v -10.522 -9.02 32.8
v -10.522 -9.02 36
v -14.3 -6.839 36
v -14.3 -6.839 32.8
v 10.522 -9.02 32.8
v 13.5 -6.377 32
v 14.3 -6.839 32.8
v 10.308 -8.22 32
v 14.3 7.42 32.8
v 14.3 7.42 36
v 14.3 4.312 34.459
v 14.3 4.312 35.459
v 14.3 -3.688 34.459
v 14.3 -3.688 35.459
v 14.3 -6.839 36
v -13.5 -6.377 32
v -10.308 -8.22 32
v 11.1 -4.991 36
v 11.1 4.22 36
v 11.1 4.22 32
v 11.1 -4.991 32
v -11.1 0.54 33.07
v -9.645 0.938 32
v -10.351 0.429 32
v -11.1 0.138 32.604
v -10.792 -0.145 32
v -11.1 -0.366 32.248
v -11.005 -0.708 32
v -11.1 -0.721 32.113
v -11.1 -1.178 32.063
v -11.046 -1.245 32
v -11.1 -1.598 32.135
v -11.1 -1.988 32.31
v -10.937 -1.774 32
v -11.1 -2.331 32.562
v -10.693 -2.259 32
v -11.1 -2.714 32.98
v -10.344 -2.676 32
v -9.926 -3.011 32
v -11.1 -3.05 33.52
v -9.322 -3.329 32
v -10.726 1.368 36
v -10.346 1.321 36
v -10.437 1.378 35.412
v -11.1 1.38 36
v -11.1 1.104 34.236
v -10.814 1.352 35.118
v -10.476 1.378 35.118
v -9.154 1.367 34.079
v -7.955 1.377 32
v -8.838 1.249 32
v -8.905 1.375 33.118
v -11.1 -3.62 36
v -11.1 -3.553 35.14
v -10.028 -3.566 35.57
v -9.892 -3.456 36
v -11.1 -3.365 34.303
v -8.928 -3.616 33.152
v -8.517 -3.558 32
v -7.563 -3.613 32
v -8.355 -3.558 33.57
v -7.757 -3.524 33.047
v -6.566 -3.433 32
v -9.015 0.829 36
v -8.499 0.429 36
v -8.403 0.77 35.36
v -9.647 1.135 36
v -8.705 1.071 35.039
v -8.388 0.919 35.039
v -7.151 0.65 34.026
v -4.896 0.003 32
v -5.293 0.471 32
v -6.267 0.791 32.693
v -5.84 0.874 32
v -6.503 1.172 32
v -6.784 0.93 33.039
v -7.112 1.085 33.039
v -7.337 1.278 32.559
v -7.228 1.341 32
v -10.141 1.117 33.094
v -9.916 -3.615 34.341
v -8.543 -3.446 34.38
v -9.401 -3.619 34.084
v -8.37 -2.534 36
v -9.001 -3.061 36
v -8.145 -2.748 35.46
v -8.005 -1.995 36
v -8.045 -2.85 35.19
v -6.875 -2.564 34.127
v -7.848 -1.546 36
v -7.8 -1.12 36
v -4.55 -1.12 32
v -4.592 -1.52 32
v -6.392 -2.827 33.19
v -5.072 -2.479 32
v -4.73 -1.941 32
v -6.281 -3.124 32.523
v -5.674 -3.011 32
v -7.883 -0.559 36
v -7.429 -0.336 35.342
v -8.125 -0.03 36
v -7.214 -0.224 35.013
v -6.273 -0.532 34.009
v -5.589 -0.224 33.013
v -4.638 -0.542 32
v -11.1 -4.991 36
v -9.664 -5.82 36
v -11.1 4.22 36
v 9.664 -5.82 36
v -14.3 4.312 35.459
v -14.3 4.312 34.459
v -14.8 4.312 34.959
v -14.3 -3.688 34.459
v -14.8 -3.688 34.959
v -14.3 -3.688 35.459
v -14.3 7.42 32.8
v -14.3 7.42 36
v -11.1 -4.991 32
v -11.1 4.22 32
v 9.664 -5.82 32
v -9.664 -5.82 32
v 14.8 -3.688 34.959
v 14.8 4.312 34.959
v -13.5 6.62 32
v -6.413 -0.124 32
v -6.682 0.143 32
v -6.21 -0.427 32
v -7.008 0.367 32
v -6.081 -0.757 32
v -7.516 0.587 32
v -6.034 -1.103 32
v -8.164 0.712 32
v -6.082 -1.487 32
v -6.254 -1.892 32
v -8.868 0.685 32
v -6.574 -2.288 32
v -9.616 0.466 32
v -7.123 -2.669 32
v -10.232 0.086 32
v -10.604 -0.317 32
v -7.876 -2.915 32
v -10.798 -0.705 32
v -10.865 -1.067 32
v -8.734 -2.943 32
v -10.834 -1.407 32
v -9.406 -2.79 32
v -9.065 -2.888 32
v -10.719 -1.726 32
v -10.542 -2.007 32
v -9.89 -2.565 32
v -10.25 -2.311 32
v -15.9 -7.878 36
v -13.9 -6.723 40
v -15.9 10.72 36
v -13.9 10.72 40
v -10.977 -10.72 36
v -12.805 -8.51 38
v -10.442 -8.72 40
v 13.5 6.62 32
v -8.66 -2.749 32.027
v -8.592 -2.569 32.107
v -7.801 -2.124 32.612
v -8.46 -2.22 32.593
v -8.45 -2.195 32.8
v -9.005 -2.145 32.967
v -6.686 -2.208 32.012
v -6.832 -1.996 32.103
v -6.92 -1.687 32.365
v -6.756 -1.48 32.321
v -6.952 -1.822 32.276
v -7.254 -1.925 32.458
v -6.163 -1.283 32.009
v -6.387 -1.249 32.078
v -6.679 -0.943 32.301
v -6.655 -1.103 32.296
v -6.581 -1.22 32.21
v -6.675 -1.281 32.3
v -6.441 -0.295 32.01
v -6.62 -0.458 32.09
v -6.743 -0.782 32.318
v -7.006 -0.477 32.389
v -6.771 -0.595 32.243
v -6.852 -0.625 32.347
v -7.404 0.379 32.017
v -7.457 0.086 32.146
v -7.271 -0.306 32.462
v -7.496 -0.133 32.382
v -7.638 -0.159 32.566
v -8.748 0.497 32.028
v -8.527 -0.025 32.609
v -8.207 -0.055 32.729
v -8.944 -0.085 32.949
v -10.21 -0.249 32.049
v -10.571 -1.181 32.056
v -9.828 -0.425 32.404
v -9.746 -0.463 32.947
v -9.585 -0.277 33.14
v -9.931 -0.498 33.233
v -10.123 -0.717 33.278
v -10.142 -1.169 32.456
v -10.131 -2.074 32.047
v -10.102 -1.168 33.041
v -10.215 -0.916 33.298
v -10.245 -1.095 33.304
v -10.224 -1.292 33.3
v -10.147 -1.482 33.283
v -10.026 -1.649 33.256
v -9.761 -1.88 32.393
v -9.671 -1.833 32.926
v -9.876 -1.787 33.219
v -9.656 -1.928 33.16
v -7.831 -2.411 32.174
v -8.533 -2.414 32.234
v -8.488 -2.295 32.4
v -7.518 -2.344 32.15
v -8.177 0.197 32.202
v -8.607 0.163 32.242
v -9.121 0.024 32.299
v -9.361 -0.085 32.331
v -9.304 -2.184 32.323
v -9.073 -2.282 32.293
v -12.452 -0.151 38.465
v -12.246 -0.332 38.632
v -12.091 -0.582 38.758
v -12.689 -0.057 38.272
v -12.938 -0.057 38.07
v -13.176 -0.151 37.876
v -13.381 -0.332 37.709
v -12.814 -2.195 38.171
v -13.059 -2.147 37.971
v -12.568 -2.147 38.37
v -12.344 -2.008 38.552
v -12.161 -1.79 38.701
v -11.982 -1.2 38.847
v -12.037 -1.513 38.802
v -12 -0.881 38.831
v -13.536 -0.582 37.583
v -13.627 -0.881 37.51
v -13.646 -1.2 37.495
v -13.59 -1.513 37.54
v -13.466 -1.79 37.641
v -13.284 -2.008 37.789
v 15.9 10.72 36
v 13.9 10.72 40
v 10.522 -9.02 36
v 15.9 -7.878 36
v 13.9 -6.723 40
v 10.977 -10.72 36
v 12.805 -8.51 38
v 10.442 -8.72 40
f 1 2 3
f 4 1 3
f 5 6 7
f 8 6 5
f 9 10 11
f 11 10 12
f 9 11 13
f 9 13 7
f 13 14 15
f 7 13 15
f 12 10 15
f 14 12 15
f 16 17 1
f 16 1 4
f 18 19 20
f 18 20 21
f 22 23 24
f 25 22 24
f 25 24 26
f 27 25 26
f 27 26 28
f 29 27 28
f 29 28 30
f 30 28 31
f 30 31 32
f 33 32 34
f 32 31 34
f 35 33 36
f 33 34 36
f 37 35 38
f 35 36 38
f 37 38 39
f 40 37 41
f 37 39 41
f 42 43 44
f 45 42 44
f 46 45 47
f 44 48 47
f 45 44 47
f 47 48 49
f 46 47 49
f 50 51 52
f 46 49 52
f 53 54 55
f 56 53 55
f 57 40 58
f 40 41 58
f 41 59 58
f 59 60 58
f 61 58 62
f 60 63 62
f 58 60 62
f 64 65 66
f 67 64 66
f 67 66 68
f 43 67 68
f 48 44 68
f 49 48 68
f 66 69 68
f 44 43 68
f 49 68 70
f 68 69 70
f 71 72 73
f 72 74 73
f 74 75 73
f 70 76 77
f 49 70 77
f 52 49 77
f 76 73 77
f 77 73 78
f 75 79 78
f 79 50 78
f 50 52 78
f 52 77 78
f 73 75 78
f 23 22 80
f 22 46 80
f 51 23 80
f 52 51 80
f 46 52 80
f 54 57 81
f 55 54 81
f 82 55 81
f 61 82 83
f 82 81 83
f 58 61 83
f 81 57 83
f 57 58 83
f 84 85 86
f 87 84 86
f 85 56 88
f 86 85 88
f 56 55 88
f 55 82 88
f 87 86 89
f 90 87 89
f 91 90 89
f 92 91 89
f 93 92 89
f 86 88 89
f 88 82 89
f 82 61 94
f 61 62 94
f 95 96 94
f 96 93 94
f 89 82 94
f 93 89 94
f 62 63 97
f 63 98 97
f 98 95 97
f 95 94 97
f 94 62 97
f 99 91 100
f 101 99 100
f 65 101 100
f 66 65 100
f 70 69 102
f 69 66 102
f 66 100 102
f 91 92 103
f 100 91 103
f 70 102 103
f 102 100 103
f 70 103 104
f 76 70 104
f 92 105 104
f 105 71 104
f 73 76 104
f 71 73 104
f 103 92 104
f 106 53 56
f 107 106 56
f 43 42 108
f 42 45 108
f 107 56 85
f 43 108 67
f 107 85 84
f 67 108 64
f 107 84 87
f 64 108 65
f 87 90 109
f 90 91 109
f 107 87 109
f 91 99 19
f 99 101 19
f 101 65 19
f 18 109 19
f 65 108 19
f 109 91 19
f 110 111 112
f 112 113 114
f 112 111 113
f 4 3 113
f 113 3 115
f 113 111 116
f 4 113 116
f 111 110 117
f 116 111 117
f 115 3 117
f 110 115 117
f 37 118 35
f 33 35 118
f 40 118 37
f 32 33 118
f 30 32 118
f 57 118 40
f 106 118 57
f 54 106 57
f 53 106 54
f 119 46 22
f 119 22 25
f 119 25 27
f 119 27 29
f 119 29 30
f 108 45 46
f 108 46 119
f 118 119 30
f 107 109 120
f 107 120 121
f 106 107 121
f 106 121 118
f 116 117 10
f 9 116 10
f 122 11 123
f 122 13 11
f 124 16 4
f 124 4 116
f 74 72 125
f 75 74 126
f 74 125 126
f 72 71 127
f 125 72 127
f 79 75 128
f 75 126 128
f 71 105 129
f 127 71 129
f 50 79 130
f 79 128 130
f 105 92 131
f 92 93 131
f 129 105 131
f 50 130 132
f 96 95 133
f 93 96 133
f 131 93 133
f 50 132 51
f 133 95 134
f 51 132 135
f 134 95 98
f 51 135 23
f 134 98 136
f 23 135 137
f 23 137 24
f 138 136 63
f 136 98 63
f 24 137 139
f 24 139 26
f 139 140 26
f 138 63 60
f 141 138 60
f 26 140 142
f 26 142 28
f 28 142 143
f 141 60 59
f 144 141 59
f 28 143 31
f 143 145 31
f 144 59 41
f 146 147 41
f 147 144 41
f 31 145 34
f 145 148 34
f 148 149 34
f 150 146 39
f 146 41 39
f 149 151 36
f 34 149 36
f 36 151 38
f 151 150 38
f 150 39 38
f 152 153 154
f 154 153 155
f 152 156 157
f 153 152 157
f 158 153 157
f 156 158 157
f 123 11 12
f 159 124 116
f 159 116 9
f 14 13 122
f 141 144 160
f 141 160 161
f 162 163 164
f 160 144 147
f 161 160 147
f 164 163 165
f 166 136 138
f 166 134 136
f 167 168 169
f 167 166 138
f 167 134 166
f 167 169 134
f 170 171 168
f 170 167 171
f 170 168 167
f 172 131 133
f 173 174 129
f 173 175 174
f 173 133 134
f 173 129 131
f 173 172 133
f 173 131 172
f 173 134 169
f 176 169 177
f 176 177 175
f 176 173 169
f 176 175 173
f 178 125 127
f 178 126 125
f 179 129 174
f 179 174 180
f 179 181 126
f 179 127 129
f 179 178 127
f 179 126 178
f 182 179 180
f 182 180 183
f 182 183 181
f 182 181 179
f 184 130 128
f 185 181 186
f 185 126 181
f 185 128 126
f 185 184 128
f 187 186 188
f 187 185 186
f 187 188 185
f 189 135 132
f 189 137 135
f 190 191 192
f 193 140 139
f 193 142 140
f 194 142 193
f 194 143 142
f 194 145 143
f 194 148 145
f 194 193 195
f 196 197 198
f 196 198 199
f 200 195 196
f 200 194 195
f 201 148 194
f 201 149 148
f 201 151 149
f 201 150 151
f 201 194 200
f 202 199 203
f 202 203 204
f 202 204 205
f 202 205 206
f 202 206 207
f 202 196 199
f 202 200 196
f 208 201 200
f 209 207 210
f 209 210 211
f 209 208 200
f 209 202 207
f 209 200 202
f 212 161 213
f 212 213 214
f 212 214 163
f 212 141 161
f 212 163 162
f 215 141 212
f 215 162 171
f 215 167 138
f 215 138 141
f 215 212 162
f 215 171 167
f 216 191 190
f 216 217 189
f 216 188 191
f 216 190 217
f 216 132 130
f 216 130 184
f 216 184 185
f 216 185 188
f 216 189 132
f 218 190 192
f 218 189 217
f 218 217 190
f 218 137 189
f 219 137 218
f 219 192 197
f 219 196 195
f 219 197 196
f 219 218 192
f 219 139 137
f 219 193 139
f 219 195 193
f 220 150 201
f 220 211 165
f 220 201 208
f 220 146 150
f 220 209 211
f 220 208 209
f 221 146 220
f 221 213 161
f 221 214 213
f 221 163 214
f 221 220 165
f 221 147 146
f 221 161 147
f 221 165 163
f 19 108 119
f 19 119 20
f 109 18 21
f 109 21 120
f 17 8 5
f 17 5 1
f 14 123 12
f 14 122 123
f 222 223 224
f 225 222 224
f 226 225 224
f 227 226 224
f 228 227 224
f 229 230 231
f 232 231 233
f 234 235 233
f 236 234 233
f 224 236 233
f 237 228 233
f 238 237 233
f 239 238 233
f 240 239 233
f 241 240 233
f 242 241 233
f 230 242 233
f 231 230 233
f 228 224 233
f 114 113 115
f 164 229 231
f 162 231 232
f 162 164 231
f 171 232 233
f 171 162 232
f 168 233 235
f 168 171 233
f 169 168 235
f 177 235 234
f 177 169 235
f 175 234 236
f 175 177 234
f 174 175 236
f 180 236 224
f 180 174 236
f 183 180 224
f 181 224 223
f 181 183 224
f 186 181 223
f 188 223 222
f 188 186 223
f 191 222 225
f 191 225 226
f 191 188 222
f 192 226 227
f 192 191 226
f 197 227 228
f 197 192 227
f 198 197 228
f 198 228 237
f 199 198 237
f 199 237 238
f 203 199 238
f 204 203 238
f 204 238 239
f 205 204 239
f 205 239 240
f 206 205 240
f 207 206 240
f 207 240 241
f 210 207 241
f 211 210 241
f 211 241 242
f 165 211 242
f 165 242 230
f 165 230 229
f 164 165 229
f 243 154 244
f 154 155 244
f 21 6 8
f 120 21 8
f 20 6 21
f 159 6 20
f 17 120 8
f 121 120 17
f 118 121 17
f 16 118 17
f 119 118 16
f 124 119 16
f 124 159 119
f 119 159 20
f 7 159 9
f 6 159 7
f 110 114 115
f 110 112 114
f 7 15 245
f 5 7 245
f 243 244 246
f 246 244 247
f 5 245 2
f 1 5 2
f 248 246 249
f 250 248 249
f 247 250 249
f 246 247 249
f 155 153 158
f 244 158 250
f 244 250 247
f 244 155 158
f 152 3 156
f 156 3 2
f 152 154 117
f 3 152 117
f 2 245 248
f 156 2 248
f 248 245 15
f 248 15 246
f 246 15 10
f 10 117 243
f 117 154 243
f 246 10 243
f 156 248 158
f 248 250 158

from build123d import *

# Parameters (mm, degrees)
PAD004_DEPTH    = 4
CHAMFER002_SIZE = 0.8
PAD015_DEPTH    = 4
SKETCH039_R     = 1.075
POCKET005_DEPTH = 10
FILLET003_R     = 0.8


with BuildPart() as part:
    # Sketch015 → AdditiveLoft001 section 0
    with BuildSketch(Plane.XY.offset(36)):
        Polygon((-15.9, 10.72), (15.9, 10.72), (15.9, -7.877957), (10.977437, -10.72), (-10.977437, -10.72), (-15.9, -7.877957), align=None)
    # Sketch016 → AdditiveLoft001 section 1
    with BuildSketch(Plane.XY.offset(40)):
        Polygon((-13.9, -6.723257), (-13.9, 10.72), (13.9, 10.72), (13.9, -6.723257), (10.441539, -8.72), (-10.441539, -8.72), align=None)
    loft()

    # Sketch017 → Pad004 (new body)
    with BuildSketch(Plane.XY.offset(36)):
        Polygon((-14.3, 7.42), (14.3, 7.42), (14.3, -6.838727), (10.521924, -9.02), (-10.521924, -9.02), (-14.3, -6.838727), align=None)
        Polygon((-11.1, 4.22), (11.1, 4.22), (11.1, -4.991206), (9.664486, -5.82), (-9.664486, -5.82), (-11.1, -4.991206), align=None, mode=Mode.SUBTRACT)
    extrude(amount=-PAD004_DEPTH)

    # Chamfer002
    chamfer002_edges = [part.edges().sort_by_distance(p)[0] for p in [
        (-14.3, 0.290637, 32),
        (-12.410962, -7.929363, 32),
        (0, -9.02, 32),
        (12.410962, -7.929363, 32),
        (14.3, 0.290637, 32),
        (0, 7.42, 32),
    ]]
    chamfer(chamfer002_edges, length=CHAMFER002_SIZE)

    # Sketch040 (on DatumPlane) → Pad015 (join, symmetric)
    with BuildSketch(Plane(origin=(-14.8, 0.311769, 0), x_dir=(-1, 0, 0), z_dir=(0, 1, 0))):
        Polygon((-29.6, 34.958579), (-29.1, 35.458579), (-29.1, 34.458579), align=None)
        Polygon((0, 34.958579), (-0.5, 35.458579), (-0.5, 34.458579), align=None)
    extrude(amount=PAD015_DEPTH, both=True)

    # Sketch018 → AdditiveLoft002 section 0
    with BuildSketch(Plane.XY.offset(36)):
        with BuildLine():
            add(Edge.make_bspline(
                [(-7.8, -1.12), (-7.8, 3.210127), (-12.675, 1.045064), (-17.55, -1.12), (-12.675, -3.285064), (-7.8, -5.450127), (-7.8, -1.12)],
                knots=[0, 0, 0, 2.094395, 2.094395, 4.18879, 4.18879, 6.283185, 6.283185, 6.283185], degree=2, weights=[1, 0.5, 1, 0.5, 1, 0.5, 1]))
        make_face()
    # Sketch019 → AdditiveLoft002 section 1
    with BuildSketch(Plane.XY.offset(32)):
        with BuildLine():
            add(Edge.make_bspline(
                [(-4.55, -1.12), (-4.55, 3.210127), (-9.425, 1.045064), (-14.3, -1.12), (-9.425, -3.285064), (-4.55, -5.450127), (-4.55, -1.12)],
                knots=[0, 0, 0, 2.094395, 2.094395, 4.18879, 4.18879, 6.283185, 6.283185, 6.283185], degree=2, weights=[1, 0.5, 1, 0.5, 1, 0.5, 1]))
        make_face()
    loft()

    # Sketch039 (on DatumPlane) → Pocket005 (cut)
    with BuildSketch(Plane(origin=(-4.55, -1.12, 32), x_dir=(0, -1, 0), z_dir=(-0.630593, 0, 0.776114))):
        with Locations((0, -2.522371)):
            Circle(SKETCH039_R)
    extrude(amount=POCKET005_DEPTH, mode=Mode.SUBTRACT)

    # Fillet003
    fillet003_edges = [part.edges().sort_by_distance(p)[0] for p in [
        (-7.799837, -0.045, 32),
    ]]
    fillet(fillet003_edges, radius=FILLET003_R)


solid = part.part
